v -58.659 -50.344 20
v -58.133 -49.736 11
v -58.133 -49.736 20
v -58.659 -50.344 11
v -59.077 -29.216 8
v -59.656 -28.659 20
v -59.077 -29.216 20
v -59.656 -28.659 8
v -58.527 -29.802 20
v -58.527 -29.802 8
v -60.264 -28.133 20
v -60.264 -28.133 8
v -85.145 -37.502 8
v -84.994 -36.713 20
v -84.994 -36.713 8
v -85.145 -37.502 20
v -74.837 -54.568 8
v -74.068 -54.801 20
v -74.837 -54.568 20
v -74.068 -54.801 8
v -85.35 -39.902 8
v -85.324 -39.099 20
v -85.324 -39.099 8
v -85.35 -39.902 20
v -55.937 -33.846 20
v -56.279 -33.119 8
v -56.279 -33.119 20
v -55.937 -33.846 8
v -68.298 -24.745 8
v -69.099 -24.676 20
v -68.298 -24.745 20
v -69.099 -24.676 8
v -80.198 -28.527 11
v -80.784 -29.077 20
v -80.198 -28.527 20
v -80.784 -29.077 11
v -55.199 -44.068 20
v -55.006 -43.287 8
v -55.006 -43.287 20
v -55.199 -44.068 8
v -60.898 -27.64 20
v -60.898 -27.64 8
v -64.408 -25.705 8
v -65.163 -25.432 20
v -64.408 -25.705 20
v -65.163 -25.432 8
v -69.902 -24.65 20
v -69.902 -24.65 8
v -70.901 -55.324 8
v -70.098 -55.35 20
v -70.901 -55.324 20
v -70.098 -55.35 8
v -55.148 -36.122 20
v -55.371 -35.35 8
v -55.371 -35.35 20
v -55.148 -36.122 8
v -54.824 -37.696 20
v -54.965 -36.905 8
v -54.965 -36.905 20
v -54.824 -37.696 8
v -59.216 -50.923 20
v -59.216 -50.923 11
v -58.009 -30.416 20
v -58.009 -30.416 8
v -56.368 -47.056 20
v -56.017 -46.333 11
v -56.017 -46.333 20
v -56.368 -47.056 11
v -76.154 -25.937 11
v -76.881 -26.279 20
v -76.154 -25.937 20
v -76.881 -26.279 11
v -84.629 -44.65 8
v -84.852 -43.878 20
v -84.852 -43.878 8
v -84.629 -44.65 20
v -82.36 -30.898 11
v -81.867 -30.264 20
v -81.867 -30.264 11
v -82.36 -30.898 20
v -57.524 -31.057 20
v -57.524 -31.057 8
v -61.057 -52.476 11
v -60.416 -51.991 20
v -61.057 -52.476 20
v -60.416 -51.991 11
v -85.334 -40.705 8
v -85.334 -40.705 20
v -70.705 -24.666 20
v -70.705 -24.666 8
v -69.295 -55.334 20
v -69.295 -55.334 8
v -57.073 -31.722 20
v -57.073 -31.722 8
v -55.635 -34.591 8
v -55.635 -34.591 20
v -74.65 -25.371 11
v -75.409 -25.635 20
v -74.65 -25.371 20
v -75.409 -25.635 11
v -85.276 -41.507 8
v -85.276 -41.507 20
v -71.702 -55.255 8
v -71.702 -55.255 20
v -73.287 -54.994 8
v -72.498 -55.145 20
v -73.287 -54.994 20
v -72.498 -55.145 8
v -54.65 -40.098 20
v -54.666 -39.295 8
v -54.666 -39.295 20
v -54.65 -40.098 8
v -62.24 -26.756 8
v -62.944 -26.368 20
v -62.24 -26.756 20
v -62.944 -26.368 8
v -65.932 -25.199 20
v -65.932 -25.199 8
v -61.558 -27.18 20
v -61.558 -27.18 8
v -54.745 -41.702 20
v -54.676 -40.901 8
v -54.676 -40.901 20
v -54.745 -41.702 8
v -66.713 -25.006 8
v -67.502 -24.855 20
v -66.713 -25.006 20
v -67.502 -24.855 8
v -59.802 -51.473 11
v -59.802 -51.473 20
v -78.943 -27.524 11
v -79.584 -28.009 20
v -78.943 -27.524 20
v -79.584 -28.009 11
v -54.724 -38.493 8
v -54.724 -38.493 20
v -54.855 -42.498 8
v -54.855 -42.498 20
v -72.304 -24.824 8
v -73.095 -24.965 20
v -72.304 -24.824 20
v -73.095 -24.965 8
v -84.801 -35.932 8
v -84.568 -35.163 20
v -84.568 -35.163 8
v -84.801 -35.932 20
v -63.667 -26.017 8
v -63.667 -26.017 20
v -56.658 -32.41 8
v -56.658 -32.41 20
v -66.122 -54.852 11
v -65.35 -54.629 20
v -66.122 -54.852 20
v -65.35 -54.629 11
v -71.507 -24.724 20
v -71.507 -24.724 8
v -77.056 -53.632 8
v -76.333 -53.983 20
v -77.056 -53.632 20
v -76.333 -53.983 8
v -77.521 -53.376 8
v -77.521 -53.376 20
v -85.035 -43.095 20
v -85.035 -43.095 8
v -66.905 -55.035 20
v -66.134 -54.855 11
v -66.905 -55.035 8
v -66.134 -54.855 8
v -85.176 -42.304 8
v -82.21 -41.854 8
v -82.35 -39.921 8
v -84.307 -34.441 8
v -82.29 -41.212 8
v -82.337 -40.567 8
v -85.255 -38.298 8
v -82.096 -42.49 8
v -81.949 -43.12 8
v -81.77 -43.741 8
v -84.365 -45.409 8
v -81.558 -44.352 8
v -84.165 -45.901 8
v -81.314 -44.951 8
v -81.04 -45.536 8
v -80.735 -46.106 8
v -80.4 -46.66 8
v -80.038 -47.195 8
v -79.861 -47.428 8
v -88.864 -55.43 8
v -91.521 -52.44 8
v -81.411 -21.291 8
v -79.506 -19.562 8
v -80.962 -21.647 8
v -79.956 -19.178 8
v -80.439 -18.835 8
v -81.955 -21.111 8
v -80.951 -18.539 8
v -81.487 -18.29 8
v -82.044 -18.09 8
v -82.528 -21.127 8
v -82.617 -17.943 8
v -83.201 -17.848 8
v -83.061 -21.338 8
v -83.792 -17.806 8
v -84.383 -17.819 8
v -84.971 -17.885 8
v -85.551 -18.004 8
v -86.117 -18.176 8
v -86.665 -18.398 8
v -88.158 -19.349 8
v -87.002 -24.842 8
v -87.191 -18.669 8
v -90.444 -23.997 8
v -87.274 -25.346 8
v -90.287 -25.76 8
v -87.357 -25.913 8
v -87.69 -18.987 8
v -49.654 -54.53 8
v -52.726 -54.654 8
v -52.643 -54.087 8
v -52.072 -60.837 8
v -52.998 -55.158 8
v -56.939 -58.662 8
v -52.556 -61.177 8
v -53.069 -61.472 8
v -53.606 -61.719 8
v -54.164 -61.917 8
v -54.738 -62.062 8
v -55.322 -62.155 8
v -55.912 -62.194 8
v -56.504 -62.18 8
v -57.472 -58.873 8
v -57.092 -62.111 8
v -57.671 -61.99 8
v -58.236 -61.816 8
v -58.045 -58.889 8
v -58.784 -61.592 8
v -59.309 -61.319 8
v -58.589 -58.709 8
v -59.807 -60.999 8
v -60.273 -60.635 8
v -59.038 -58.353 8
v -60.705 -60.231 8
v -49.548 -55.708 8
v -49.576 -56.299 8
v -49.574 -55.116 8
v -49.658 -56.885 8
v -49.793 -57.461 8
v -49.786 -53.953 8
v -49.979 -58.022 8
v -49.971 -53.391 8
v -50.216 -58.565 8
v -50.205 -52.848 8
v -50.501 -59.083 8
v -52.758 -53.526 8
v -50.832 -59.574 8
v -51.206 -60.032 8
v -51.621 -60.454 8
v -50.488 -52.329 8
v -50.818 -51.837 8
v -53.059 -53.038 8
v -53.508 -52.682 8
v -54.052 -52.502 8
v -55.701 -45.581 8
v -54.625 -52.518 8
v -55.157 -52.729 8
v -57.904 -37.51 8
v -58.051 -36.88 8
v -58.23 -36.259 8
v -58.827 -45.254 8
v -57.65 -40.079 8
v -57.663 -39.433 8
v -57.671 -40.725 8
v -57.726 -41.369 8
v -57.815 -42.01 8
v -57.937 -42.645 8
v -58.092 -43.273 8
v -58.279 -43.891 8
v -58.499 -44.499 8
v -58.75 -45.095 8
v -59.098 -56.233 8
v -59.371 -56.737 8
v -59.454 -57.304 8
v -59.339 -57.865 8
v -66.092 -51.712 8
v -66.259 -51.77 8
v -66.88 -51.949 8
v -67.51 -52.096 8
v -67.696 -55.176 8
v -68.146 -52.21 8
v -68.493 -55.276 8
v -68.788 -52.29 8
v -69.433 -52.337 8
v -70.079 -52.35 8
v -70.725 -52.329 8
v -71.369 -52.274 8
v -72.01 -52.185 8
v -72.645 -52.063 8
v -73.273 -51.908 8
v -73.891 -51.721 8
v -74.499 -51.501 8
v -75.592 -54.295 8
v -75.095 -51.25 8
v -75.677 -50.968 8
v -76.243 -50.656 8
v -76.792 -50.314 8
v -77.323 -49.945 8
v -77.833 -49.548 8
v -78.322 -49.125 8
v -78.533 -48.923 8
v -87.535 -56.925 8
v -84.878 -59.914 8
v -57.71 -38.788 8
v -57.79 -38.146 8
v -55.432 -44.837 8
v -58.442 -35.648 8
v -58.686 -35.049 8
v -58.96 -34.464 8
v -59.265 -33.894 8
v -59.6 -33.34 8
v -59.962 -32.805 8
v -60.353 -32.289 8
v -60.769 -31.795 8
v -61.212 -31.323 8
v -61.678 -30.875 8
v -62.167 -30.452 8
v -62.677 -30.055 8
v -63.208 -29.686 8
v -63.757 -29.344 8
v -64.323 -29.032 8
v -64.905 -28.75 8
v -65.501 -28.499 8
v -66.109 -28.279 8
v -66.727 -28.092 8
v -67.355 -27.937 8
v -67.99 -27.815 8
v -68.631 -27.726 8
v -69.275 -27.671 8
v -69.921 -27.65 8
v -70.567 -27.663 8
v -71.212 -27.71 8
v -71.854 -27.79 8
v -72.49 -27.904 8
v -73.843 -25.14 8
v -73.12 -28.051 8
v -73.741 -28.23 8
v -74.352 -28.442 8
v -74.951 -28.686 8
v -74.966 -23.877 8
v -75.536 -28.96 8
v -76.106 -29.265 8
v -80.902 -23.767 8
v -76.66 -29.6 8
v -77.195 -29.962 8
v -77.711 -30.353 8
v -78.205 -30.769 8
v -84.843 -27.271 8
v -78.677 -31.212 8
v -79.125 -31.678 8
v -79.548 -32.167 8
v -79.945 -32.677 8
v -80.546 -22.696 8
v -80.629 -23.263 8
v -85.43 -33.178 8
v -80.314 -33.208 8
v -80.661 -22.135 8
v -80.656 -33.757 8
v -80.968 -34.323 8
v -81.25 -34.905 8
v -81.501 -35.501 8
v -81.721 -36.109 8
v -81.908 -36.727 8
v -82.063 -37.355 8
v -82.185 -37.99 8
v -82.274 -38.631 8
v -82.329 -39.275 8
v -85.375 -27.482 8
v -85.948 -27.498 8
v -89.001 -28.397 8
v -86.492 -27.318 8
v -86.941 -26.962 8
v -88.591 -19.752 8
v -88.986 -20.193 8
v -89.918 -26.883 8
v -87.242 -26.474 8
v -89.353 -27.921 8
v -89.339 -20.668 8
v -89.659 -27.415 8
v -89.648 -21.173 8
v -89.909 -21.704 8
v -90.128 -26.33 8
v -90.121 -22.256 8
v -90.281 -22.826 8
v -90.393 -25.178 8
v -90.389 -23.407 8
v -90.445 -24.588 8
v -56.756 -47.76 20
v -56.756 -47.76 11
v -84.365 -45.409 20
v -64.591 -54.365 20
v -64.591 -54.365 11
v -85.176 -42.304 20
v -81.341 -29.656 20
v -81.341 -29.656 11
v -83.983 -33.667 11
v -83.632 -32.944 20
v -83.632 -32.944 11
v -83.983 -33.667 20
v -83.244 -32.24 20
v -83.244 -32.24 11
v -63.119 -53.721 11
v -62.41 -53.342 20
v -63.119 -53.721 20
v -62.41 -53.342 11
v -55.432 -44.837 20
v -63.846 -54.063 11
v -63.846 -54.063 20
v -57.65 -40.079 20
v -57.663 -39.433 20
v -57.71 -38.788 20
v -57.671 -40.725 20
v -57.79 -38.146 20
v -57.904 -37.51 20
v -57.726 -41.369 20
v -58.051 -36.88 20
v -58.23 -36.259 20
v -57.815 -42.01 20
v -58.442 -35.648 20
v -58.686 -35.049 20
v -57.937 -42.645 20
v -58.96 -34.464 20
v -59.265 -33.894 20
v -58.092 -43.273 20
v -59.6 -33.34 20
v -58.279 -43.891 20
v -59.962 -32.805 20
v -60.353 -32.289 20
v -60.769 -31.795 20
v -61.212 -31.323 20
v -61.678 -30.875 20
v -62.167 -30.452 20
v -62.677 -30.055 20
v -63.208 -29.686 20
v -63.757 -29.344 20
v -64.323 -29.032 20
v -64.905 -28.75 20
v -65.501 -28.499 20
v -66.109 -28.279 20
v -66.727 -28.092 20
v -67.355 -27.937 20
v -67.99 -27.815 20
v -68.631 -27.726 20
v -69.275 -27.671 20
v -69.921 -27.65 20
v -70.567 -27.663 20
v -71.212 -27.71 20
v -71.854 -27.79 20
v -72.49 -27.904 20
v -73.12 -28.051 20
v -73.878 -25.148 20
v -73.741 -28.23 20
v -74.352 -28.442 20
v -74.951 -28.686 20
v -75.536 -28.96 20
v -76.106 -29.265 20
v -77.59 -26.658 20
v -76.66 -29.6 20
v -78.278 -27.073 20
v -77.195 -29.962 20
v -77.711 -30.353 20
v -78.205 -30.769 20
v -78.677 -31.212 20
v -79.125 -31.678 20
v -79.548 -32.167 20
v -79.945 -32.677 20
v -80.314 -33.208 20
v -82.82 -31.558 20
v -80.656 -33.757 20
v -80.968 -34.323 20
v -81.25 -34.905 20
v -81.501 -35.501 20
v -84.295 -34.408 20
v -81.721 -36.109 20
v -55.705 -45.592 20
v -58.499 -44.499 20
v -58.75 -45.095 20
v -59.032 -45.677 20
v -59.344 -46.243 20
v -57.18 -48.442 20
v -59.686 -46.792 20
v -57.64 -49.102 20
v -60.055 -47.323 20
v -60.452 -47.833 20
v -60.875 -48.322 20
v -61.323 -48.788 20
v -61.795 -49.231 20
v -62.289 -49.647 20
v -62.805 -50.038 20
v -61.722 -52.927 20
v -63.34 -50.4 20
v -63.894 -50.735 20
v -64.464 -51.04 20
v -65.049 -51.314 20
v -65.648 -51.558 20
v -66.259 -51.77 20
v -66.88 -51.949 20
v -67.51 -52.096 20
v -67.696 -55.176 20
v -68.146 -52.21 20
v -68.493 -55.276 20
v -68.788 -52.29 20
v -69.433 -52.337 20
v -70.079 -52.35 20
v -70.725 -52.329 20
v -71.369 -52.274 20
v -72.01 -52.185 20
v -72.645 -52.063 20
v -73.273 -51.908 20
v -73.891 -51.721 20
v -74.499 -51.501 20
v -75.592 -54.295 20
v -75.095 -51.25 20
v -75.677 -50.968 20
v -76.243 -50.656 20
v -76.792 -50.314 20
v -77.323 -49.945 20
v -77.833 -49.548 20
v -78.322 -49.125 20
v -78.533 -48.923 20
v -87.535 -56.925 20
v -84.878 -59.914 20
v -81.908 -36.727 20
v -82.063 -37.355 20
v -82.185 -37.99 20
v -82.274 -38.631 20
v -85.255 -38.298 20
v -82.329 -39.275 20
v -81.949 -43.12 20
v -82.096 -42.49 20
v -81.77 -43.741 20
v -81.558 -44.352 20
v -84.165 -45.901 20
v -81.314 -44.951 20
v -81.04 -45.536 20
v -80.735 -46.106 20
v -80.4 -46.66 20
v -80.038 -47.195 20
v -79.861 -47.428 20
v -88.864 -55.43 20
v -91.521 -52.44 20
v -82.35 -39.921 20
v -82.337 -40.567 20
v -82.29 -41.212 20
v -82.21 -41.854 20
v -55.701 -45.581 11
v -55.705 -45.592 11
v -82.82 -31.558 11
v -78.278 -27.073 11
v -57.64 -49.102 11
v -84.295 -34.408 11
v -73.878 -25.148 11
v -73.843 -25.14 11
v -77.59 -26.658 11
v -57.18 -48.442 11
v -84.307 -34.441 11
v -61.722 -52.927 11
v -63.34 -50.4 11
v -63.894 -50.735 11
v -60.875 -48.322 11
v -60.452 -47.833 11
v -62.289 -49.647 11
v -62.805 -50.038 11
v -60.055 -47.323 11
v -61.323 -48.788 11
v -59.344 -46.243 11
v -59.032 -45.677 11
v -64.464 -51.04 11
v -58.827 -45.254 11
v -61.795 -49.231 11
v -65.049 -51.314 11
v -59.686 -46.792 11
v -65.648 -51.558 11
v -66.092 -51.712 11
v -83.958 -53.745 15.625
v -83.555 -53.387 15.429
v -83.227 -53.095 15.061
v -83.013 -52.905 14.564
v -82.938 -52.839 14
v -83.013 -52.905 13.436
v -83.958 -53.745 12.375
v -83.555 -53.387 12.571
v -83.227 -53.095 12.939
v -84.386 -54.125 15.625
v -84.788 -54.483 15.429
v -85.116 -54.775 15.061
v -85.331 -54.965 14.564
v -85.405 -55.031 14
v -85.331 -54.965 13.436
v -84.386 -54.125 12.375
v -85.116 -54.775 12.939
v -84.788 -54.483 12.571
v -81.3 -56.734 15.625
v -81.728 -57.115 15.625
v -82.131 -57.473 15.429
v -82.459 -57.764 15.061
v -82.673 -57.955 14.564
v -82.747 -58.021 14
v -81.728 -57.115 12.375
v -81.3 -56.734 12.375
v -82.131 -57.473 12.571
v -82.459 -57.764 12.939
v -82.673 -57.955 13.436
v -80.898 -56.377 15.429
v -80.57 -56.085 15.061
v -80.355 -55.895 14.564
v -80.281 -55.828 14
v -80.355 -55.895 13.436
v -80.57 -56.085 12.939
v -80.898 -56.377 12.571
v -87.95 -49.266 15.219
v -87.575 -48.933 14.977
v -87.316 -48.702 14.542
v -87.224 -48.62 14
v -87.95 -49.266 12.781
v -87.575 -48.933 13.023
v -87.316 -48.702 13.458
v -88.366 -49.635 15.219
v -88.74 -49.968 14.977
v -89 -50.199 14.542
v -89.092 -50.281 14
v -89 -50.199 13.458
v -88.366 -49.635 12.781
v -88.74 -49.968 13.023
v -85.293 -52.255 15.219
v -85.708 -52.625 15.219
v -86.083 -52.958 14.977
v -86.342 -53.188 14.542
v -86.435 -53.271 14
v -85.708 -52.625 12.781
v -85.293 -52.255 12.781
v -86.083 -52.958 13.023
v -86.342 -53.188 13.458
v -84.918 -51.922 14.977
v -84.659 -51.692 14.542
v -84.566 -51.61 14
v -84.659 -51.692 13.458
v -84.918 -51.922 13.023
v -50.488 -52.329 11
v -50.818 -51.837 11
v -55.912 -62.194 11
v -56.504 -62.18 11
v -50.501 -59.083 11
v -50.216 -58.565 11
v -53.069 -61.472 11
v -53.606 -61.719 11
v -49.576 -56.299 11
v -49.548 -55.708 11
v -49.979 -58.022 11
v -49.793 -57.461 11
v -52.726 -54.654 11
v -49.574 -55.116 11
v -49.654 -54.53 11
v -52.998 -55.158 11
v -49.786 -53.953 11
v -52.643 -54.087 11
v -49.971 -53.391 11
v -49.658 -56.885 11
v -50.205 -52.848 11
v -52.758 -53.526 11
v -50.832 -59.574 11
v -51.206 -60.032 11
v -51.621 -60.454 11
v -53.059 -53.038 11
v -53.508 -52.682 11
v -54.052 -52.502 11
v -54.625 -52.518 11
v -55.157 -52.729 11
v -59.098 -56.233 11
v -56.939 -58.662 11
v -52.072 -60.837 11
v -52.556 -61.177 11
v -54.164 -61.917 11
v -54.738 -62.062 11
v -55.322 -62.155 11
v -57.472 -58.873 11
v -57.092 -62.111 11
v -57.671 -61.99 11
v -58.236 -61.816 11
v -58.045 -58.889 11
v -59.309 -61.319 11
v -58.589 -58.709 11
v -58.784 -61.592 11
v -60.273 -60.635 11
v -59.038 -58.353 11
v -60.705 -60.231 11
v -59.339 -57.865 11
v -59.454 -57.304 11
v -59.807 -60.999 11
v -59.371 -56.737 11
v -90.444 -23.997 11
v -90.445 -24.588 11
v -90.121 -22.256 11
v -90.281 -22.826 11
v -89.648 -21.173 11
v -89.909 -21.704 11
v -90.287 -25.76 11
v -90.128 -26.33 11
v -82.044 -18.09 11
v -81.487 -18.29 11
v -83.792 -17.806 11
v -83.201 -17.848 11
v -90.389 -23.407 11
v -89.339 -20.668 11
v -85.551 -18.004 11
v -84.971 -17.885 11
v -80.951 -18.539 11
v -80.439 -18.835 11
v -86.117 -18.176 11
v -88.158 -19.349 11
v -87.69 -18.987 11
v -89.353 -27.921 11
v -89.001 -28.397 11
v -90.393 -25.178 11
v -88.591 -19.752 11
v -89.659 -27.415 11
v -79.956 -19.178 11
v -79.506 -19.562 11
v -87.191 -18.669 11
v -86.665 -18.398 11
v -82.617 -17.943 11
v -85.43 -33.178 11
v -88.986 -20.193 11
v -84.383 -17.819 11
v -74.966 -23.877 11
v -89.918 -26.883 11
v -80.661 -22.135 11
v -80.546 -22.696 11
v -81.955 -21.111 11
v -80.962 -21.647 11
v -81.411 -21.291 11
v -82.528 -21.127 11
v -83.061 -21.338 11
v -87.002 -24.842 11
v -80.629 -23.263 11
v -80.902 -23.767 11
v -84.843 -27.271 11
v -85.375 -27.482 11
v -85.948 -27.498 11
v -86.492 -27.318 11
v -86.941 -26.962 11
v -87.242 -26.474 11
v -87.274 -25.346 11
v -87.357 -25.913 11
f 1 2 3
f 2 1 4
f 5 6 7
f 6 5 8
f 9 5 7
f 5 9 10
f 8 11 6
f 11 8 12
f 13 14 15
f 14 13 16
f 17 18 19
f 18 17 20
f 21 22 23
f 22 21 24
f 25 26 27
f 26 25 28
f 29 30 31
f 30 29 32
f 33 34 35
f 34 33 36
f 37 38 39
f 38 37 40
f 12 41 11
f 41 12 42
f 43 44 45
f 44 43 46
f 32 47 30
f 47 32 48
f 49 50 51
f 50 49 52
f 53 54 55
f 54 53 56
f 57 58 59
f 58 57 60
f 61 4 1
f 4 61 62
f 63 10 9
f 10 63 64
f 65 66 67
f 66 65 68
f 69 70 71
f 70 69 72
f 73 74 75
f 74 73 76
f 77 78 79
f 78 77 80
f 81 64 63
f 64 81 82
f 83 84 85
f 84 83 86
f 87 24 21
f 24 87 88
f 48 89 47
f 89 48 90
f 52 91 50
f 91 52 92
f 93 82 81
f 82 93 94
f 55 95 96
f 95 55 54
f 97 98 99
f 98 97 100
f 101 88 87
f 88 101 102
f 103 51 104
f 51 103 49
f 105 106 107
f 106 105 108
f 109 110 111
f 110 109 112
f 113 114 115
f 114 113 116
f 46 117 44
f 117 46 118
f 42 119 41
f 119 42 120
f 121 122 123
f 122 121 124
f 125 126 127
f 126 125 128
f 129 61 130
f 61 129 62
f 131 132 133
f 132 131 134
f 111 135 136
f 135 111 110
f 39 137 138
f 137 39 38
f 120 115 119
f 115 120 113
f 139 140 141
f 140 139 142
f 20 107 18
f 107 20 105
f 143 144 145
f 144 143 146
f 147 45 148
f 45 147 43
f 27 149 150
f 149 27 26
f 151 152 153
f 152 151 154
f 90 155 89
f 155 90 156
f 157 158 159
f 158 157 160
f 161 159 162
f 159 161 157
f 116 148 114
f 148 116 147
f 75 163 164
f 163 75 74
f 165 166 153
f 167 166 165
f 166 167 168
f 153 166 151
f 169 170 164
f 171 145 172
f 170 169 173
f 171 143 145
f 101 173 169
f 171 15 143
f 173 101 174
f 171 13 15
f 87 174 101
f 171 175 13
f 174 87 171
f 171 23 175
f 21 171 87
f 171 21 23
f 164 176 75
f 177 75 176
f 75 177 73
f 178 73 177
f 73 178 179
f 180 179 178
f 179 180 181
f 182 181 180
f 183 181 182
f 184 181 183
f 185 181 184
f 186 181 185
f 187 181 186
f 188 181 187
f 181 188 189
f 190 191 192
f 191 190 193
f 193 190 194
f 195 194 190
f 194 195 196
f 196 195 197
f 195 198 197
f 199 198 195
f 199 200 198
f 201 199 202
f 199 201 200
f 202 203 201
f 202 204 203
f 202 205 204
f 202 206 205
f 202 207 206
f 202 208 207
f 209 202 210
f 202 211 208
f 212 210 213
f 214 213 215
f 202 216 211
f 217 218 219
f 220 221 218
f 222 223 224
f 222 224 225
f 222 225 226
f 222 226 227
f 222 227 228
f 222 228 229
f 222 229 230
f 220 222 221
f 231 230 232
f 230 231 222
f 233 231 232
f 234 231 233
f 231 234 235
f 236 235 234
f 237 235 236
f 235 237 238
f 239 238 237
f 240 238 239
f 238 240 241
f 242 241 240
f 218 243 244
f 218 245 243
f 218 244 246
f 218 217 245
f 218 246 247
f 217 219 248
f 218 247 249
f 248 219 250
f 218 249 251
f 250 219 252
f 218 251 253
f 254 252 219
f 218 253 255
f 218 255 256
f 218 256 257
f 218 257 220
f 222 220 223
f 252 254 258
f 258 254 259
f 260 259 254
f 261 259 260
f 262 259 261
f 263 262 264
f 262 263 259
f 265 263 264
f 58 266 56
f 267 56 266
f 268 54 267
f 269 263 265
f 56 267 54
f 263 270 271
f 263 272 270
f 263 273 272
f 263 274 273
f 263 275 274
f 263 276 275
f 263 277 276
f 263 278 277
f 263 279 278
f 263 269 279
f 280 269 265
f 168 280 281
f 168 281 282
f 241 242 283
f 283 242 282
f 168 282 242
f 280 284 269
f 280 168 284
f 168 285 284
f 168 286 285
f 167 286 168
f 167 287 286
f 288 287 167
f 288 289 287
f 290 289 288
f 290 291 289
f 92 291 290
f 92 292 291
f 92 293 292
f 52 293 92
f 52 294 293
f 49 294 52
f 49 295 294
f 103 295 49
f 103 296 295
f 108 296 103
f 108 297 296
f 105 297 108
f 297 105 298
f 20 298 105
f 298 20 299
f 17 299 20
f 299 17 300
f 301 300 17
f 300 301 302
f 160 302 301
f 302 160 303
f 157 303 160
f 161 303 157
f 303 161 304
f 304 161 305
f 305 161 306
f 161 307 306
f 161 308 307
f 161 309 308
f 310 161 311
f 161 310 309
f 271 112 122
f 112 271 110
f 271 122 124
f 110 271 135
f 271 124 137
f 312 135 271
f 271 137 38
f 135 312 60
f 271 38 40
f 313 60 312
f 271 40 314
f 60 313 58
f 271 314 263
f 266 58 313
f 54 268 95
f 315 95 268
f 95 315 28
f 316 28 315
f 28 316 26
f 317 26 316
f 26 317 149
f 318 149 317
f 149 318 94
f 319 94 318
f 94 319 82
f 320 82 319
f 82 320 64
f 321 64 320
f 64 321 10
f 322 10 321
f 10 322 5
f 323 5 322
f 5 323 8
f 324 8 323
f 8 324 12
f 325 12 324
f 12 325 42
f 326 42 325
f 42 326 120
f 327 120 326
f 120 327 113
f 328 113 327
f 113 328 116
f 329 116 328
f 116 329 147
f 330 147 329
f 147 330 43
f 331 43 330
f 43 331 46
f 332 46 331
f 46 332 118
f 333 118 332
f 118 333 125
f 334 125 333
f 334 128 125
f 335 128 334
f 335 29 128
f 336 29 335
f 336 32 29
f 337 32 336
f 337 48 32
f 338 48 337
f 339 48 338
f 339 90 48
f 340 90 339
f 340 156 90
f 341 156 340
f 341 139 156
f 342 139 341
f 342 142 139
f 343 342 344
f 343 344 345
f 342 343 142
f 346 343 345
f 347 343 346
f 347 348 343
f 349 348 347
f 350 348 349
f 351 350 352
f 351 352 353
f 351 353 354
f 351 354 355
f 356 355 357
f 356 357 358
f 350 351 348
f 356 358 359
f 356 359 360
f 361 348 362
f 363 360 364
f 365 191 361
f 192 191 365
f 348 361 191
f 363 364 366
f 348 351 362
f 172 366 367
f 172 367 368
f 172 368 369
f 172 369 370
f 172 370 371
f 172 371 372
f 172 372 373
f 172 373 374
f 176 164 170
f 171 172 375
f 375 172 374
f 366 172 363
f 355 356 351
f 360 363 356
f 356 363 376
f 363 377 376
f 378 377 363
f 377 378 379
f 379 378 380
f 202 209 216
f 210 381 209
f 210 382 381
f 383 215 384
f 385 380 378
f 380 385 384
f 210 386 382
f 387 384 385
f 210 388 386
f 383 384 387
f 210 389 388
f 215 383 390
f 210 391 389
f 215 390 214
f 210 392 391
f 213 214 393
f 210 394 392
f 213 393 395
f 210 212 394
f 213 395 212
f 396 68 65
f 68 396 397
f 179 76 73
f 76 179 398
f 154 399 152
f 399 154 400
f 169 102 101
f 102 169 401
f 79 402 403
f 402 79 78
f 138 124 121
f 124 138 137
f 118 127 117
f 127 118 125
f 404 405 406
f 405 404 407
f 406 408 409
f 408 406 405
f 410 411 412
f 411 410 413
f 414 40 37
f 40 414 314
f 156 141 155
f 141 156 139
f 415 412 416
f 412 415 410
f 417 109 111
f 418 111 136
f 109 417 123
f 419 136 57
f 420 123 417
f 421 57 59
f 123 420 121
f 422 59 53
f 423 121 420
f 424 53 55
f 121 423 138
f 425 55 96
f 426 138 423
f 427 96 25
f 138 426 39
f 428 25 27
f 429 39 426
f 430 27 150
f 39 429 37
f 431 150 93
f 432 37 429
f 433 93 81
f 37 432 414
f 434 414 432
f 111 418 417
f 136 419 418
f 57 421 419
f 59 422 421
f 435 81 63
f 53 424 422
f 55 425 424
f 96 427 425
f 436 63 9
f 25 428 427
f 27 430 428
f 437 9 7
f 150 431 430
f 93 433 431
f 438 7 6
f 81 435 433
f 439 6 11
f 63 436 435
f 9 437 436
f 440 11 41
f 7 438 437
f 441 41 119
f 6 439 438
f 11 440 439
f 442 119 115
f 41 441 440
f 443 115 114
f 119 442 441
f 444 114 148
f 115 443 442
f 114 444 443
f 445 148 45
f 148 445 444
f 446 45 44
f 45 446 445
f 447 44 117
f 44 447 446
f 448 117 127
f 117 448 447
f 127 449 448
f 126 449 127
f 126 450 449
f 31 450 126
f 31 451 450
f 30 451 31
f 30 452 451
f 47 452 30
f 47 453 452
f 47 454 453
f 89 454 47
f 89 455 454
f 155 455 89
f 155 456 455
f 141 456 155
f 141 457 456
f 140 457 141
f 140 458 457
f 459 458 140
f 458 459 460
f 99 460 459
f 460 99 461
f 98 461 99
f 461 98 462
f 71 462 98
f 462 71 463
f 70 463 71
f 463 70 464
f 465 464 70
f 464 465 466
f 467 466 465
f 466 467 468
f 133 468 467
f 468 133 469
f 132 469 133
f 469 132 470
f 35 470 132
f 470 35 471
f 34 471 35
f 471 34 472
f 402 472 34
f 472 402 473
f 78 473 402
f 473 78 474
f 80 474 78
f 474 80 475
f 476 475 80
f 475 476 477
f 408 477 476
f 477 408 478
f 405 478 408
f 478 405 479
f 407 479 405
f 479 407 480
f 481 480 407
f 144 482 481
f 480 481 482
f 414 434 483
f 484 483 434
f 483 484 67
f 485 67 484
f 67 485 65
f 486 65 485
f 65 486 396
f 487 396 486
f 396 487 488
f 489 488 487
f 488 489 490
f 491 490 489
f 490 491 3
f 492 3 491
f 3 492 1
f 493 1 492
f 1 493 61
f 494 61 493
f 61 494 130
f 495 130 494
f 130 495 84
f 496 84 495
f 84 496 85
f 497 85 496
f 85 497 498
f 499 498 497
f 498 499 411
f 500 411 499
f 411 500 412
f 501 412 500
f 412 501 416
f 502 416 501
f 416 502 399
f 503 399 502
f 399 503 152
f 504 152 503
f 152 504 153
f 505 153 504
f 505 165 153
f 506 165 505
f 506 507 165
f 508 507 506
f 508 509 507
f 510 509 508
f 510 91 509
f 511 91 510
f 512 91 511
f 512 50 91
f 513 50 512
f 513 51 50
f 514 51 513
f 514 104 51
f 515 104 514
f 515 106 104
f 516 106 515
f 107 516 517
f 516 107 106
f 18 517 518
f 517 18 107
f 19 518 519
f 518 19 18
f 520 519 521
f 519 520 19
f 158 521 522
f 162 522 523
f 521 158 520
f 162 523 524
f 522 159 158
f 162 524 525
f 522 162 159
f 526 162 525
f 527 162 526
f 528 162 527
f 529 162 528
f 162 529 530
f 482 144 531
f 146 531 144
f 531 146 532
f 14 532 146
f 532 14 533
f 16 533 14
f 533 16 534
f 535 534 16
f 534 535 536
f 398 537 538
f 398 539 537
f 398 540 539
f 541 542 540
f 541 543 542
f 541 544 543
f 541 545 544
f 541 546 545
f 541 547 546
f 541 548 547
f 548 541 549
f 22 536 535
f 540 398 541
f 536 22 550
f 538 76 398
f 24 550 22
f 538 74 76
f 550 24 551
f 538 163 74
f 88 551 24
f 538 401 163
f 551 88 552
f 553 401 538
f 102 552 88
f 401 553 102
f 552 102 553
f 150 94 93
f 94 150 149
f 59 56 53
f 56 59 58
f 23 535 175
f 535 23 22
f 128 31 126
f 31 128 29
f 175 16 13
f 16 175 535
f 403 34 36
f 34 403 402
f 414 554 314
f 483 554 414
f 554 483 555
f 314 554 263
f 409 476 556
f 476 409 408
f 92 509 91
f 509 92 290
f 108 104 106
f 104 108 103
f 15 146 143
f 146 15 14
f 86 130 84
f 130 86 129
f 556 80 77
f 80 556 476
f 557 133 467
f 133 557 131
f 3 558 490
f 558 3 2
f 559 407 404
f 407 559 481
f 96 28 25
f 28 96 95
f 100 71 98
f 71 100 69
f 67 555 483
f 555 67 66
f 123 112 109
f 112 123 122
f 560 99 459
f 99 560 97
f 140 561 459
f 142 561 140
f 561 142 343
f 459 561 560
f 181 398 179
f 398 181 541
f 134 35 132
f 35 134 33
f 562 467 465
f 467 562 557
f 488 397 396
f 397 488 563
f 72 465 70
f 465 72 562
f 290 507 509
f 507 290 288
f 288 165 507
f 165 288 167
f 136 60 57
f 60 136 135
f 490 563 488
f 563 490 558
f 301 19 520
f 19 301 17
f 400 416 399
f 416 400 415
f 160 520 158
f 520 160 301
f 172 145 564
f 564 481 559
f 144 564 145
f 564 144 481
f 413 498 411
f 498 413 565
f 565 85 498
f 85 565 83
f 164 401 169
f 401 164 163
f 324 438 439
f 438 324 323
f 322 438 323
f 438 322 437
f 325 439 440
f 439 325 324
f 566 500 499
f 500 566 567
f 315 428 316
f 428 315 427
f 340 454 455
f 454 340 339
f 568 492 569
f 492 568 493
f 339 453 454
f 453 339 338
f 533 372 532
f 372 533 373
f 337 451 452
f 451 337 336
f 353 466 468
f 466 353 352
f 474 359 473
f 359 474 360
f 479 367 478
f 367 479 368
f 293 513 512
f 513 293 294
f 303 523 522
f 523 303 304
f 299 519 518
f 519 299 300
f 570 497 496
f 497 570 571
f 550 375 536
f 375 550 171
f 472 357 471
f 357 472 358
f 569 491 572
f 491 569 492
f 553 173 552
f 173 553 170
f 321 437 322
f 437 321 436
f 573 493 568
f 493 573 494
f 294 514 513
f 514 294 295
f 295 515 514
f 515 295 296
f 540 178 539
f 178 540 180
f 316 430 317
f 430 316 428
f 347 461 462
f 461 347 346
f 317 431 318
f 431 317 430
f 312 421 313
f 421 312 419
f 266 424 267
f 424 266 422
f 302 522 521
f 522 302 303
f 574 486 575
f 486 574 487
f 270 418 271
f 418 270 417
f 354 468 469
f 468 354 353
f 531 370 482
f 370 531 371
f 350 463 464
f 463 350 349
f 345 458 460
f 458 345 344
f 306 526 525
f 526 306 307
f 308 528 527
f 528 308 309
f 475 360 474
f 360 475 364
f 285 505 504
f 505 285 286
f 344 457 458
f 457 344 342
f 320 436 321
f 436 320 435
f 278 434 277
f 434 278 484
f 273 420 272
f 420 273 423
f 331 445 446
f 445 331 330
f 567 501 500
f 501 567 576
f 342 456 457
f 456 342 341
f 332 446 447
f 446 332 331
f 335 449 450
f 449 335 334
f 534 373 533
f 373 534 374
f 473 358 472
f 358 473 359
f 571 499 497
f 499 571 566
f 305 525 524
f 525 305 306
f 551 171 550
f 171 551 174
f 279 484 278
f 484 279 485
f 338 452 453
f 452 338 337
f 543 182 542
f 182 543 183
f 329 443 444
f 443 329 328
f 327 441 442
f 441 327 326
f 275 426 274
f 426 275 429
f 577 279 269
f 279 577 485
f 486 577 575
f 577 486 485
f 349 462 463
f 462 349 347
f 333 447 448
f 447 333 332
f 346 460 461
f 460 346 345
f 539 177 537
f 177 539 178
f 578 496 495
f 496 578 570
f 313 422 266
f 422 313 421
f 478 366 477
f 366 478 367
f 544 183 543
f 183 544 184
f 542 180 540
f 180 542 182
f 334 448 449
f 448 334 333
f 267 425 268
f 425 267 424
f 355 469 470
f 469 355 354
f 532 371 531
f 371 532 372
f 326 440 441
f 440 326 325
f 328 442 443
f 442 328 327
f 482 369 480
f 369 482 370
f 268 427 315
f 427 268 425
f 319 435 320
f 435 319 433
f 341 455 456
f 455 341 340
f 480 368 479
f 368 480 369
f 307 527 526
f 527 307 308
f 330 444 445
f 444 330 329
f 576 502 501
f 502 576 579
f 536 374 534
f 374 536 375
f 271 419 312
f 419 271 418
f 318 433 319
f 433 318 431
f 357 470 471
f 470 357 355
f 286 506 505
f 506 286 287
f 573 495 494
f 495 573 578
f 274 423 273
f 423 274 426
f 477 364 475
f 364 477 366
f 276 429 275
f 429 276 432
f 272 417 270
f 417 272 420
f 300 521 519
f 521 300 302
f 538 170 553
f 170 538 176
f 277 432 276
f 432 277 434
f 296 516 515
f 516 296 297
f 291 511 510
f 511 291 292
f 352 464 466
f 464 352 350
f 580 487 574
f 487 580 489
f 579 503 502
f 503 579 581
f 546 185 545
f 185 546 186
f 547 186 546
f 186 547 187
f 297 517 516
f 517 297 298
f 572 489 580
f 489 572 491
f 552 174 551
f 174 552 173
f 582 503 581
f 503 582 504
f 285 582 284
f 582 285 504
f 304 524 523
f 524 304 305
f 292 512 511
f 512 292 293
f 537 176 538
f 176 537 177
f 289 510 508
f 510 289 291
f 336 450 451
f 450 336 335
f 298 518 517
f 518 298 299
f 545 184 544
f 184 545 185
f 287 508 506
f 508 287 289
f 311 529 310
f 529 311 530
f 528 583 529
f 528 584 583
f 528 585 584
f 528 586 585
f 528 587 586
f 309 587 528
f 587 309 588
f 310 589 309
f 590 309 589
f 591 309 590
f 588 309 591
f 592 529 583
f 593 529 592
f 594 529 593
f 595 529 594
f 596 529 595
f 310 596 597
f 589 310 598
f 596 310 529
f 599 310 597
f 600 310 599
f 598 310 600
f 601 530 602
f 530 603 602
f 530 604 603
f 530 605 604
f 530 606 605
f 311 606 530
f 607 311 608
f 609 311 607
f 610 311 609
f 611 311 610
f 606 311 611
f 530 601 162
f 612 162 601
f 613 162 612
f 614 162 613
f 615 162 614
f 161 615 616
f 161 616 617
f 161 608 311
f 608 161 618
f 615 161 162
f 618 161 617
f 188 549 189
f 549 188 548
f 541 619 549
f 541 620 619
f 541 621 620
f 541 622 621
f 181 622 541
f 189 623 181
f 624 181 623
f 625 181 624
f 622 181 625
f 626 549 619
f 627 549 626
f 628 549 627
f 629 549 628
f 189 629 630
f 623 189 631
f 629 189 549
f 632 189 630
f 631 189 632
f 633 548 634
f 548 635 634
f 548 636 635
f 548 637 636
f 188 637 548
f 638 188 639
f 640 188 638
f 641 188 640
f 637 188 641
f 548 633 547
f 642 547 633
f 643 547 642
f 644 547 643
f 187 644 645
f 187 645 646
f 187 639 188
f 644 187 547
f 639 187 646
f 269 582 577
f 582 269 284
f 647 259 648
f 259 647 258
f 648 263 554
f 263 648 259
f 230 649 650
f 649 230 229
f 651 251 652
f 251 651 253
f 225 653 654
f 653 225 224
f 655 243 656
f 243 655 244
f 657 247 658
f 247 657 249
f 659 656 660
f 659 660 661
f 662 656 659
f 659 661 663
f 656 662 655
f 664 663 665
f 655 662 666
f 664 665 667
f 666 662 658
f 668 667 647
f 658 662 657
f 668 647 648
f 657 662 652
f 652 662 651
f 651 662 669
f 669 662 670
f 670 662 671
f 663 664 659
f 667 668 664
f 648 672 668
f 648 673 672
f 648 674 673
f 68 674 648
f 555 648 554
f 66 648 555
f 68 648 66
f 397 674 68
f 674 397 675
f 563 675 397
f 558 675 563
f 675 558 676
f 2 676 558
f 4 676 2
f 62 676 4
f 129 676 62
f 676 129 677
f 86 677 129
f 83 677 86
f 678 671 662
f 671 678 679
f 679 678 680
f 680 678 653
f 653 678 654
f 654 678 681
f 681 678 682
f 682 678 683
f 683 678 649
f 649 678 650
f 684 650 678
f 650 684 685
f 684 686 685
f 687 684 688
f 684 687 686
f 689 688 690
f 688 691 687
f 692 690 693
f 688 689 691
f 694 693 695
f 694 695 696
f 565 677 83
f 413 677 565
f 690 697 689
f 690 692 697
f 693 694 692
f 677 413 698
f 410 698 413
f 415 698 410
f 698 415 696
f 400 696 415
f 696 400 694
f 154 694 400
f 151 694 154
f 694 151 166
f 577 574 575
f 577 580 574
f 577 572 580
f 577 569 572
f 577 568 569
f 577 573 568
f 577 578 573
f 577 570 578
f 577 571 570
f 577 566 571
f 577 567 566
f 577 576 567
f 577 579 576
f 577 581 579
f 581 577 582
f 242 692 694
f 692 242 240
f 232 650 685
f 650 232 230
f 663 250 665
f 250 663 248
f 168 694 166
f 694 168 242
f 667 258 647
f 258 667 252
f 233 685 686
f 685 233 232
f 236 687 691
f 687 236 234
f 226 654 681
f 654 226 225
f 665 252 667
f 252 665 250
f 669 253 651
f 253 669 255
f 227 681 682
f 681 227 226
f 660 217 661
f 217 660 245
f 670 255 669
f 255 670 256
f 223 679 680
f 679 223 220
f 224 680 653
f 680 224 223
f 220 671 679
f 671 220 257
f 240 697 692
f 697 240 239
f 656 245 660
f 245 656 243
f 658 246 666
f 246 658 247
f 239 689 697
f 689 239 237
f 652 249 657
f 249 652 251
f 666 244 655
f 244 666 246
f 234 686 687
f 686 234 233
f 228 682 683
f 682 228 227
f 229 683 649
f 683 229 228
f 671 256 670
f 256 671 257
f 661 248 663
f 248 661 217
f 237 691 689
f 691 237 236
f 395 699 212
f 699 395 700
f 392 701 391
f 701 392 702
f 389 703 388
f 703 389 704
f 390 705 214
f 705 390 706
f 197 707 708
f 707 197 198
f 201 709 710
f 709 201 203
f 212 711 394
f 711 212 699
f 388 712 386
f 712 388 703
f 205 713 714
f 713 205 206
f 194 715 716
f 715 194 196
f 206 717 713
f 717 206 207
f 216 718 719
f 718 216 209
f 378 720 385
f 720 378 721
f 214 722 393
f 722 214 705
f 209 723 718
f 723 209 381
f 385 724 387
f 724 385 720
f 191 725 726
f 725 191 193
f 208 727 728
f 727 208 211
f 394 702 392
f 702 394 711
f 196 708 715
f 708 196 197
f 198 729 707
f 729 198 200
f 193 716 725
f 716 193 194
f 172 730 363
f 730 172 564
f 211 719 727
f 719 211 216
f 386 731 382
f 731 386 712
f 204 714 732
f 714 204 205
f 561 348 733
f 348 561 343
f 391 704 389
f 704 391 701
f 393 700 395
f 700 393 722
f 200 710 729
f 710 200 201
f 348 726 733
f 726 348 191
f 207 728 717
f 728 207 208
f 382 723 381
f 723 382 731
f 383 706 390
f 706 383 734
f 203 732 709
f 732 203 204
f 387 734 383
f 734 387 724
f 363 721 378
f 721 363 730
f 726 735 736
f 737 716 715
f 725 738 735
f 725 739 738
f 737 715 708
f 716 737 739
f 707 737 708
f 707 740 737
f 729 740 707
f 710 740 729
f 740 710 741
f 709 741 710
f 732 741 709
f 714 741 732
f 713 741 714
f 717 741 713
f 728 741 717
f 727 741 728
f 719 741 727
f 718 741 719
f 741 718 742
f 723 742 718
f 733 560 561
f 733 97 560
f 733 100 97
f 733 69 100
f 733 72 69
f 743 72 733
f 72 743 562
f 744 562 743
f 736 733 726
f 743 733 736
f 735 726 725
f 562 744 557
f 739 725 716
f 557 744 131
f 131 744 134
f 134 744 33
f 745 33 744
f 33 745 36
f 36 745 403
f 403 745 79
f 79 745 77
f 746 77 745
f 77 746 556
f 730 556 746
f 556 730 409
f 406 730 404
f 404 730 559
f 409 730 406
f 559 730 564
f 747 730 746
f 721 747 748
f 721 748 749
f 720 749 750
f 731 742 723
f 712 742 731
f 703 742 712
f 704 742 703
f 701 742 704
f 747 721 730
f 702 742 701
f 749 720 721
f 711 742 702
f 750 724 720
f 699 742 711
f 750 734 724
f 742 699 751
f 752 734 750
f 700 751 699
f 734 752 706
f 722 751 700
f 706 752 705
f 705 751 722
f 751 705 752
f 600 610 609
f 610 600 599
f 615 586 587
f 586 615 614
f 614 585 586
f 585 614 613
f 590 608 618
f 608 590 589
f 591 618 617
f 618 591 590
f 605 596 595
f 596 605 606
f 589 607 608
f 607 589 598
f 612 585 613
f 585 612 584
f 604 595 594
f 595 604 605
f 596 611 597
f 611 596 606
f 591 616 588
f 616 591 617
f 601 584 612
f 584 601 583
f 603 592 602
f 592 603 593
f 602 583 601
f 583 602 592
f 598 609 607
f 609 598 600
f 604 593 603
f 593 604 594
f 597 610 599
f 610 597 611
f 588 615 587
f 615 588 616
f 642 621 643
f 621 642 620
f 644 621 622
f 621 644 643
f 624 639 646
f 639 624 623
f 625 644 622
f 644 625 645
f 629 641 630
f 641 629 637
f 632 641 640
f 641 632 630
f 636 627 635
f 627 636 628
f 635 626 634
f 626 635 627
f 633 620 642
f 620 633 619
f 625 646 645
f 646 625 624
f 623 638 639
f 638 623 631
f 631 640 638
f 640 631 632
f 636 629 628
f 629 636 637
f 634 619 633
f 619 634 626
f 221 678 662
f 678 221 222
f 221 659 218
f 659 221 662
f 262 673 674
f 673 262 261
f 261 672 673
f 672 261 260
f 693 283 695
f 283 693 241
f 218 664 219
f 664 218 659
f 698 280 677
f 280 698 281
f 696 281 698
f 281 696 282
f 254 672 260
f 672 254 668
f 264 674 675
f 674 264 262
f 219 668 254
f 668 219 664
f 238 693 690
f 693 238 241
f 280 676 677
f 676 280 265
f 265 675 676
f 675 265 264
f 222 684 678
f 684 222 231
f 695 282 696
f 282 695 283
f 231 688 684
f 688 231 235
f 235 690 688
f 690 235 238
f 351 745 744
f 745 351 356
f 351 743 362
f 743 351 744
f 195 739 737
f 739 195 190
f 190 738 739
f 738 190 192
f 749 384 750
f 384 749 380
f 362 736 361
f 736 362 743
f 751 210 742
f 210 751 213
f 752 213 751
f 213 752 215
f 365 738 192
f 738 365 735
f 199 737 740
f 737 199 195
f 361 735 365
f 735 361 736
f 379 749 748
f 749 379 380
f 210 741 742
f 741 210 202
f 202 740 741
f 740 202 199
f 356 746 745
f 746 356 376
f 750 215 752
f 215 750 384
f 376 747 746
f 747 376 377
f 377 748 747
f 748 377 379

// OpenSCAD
// file: ../lib/common.scad
// ============================================================================
//  Вспомогательные модули общего назначения.
//  Подключать через use <lib/common.scad> — файл не содержит параметров
//  проекта и ни от чего не зависит.
// ============================================================================

_eps = 0.01;

// --------------------------------------------------------------------- 2D ---
// Прямоугольник со скруглёнными углами, по центру
module rrect(w, d, r) {
    rr = min(r, w/2 - _eps, d/2 - _eps);
    if (rr > 0) offset(r = rr) square([w - 2*rr, d - 2*rr], center = true);
    else square([w, d], center = true);
}

// --------------------------------------------------------------------- 3D ---
// Коробка со скруглением ТОЛЬКО вертикальных рёбер: нижние и верхние острые
module rounded_box(w, d, h, r) linear_extrude(height = h) rrect(w, d, r);

// Цилиндр с фасками на торцах (снимает «слоновью ногу» и облегчает посадку)
module chamfered_cyl(d, h, ch = 0.6, bottom = true, top = true) {
    r  = d/2;
    cb = bottom ? min(ch, h/2) : 0;
    ct = top    ? min(ch, h/2) : 0;
    if (cb <= 0 && ct <= 0) cylinder(d = d, h = h);
    else rotate_extrude(angle = 360) polygon(concat(
        [[0, 0]],
        cb > 0 ? [[r - cb, 0], [r, cb]] : [[r, 0]],
        ct > 0 ? [[r, h - ct], [r - ct, h]] : [[r, h]],
        [[0, h]]));
}

// Труба
module tube(od, id, h) difference() {
    cylinder(d = od, h = h);
    translate([0, 0, -_eps]) cylinder(d = id, h = h + 2*_eps);
}

// Сквозное отверстие, растянутое вверх-вниз для гарантированного вычитания
module thru(d, h) translate([0, 0, -_eps]) cylinder(d = d, h = h + 2*_eps);

// Потайное отверстие под саморез с конической головкой.
// Пластина занимает z = [0 .. t], головка утапливается сверху,
// саморез идёт вниз (в ответную стойку).
module countersunk_hole(free_d, head_d, t, down = 30) {
    cone_h = (head_d - free_d)/2;    // головка 90 градусов
    union() {
        translate([0, 0, -down]) cylinder(d = free_d, h = down + t - cone_h + _eps);
        translate([0, 0, t - cone_h]) cylinder(d1 = free_d, d2 = head_d, h = cone_h);
    }
}

// Паз (щелевое отверстие) длиной len по X, сквозной по высоте h
module slot(len, d, h) hull() for (s = [-1, 1])
    translate([s*(len - d)/2, 0, 0]) cylinder(d = d, h = h);

// Стойка под саморез: цилиндр с пилотным отверстием сверху.
// Снизу фаски нет — стойка растёт из дна детали.
module screw_boss(od, h, pilot_d, pilot_depth, ch = 0.6) difference() {
    chamfered_cyl(od, h, ch = ch, bottom = false, top = true);
    translate([0, 0, h - pilot_depth]) cylinder(d = pilot_d, h = pilot_depth + _eps);
}

// Треугольная косынка в плоскости XZ (катеты l по X и h по Z), толщина t по Y
module gusset(l, h, t) translate([0, -t/2, 0]) linear_extrude(height = t)
    polygon([[0, 0], [l, 0], [0, h]]);

// Конусное гнездо под заточенный винт-ось (ось Z вниз от z=0)
module cone_seat(d, depth) translate([0, 0, -depth])
    cylinder(d1 = 0.2, d2 = d, h = depth + _eps);

// Канавка под круглый пассик: тор, вычитаемый из обода
module belt_groove(pulley_d, groove_r) rotate_extrude(angle = 360)
    translate([pulley_d/2, 0]) circle(r = groove_r);

// Сетка облегчающих отверстий по кругу
module radial_holes(n, r, d, h) for (i = [0 : n - 1])
    rotate([0, 0, i*360/n]) translate([r, 0, 0]) thru(d, h);
// main file
// ============================================================================
//  ХОМУТ ДВИГАТЕЛЯ
//
//  Двигатель стоит валом вверх прямо на дне поддона, а этот хомут держит
//  его за корпус. Лапы с пазами позволяют подвинуть двигатель по линии
//  «двигатель — ось диска» и натянуть пассик; сам двигатель можно
//  подвинуть по высоте, ослабив стяжной винт.
//
//  ВНИМАНИЕ: размеры под двигатель предварительные (motor_body_d/h) —
//  двигатель пока не выбран. Меняется одним параметром.
//
//  Печать: как есть, плашмя (лапы и нижний торец хомута в одной плоскости).
// ============================================================================

include <../params.scad>
use <../lib/common.scad>

module motor_mount() {
    id = motor_body_d + motor_clamp_clr;
    od = id + 2*motor_clamp_t;
    translate([motor_pos[0], motor_pos[1], 0]) rotate([0, 0, motor_dir]) {
        difference() {
            union() {
                // хомут
                translate([0, 0, motor_clamp_z]) tube(od, id, motor_clamp_h);
                // «уши» стяжного винта (по обе стороны прорези)
                for (s = [-1, 1])
                    translate([-(od/2 + motor_ear), s == 1 ? 1 : -5, motor_clamp_z])
                        cube([motor_ear + (od - id)/2, 4, motor_clamp_h]);
                // лапы
                for (s = [-1, 1]) hull() {
                    translate([0, s*motor_foot_span/2, motor_clamp_z])
                        cylinder(d = motor_boss_d + 4, h = motor_foot_t);
                    translate([-7, s*(od/2 - 2), motor_clamp_z])
                        cube([14, 2, motor_foot_t]);
                }
            }
            // прорезь хомута
            translate([-(od/2 + motor_ear + 1), -1, motor_clamp_z - eps])
                cube([od/2 + motor_ear + 1, 2, motor_clamp_h + 2*eps]);
            // стяжной винт 3x16: проходное с одной стороны, пилотное с другой
            translate([-(od/2 + motor_ear/2), 0, motor_clamp_z + motor_clamp_h/2])
                rotate([90, 0, 0]) {
                    cylinder(d = scr3_free, h = 10);
                    translate([0, 0, -10]) cylinder(d = scr3_pilot, h = 10);
                }
            // пазы регулировки натяжения пассика
            for (s = [-1, 1])
                translate([0, s*motor_foot_span/2, motor_clamp_z - eps])
                    slot(motor_slot_len, scr3_free, motor_foot_t + 2*eps);
        }
    }
}

motor_mount();
